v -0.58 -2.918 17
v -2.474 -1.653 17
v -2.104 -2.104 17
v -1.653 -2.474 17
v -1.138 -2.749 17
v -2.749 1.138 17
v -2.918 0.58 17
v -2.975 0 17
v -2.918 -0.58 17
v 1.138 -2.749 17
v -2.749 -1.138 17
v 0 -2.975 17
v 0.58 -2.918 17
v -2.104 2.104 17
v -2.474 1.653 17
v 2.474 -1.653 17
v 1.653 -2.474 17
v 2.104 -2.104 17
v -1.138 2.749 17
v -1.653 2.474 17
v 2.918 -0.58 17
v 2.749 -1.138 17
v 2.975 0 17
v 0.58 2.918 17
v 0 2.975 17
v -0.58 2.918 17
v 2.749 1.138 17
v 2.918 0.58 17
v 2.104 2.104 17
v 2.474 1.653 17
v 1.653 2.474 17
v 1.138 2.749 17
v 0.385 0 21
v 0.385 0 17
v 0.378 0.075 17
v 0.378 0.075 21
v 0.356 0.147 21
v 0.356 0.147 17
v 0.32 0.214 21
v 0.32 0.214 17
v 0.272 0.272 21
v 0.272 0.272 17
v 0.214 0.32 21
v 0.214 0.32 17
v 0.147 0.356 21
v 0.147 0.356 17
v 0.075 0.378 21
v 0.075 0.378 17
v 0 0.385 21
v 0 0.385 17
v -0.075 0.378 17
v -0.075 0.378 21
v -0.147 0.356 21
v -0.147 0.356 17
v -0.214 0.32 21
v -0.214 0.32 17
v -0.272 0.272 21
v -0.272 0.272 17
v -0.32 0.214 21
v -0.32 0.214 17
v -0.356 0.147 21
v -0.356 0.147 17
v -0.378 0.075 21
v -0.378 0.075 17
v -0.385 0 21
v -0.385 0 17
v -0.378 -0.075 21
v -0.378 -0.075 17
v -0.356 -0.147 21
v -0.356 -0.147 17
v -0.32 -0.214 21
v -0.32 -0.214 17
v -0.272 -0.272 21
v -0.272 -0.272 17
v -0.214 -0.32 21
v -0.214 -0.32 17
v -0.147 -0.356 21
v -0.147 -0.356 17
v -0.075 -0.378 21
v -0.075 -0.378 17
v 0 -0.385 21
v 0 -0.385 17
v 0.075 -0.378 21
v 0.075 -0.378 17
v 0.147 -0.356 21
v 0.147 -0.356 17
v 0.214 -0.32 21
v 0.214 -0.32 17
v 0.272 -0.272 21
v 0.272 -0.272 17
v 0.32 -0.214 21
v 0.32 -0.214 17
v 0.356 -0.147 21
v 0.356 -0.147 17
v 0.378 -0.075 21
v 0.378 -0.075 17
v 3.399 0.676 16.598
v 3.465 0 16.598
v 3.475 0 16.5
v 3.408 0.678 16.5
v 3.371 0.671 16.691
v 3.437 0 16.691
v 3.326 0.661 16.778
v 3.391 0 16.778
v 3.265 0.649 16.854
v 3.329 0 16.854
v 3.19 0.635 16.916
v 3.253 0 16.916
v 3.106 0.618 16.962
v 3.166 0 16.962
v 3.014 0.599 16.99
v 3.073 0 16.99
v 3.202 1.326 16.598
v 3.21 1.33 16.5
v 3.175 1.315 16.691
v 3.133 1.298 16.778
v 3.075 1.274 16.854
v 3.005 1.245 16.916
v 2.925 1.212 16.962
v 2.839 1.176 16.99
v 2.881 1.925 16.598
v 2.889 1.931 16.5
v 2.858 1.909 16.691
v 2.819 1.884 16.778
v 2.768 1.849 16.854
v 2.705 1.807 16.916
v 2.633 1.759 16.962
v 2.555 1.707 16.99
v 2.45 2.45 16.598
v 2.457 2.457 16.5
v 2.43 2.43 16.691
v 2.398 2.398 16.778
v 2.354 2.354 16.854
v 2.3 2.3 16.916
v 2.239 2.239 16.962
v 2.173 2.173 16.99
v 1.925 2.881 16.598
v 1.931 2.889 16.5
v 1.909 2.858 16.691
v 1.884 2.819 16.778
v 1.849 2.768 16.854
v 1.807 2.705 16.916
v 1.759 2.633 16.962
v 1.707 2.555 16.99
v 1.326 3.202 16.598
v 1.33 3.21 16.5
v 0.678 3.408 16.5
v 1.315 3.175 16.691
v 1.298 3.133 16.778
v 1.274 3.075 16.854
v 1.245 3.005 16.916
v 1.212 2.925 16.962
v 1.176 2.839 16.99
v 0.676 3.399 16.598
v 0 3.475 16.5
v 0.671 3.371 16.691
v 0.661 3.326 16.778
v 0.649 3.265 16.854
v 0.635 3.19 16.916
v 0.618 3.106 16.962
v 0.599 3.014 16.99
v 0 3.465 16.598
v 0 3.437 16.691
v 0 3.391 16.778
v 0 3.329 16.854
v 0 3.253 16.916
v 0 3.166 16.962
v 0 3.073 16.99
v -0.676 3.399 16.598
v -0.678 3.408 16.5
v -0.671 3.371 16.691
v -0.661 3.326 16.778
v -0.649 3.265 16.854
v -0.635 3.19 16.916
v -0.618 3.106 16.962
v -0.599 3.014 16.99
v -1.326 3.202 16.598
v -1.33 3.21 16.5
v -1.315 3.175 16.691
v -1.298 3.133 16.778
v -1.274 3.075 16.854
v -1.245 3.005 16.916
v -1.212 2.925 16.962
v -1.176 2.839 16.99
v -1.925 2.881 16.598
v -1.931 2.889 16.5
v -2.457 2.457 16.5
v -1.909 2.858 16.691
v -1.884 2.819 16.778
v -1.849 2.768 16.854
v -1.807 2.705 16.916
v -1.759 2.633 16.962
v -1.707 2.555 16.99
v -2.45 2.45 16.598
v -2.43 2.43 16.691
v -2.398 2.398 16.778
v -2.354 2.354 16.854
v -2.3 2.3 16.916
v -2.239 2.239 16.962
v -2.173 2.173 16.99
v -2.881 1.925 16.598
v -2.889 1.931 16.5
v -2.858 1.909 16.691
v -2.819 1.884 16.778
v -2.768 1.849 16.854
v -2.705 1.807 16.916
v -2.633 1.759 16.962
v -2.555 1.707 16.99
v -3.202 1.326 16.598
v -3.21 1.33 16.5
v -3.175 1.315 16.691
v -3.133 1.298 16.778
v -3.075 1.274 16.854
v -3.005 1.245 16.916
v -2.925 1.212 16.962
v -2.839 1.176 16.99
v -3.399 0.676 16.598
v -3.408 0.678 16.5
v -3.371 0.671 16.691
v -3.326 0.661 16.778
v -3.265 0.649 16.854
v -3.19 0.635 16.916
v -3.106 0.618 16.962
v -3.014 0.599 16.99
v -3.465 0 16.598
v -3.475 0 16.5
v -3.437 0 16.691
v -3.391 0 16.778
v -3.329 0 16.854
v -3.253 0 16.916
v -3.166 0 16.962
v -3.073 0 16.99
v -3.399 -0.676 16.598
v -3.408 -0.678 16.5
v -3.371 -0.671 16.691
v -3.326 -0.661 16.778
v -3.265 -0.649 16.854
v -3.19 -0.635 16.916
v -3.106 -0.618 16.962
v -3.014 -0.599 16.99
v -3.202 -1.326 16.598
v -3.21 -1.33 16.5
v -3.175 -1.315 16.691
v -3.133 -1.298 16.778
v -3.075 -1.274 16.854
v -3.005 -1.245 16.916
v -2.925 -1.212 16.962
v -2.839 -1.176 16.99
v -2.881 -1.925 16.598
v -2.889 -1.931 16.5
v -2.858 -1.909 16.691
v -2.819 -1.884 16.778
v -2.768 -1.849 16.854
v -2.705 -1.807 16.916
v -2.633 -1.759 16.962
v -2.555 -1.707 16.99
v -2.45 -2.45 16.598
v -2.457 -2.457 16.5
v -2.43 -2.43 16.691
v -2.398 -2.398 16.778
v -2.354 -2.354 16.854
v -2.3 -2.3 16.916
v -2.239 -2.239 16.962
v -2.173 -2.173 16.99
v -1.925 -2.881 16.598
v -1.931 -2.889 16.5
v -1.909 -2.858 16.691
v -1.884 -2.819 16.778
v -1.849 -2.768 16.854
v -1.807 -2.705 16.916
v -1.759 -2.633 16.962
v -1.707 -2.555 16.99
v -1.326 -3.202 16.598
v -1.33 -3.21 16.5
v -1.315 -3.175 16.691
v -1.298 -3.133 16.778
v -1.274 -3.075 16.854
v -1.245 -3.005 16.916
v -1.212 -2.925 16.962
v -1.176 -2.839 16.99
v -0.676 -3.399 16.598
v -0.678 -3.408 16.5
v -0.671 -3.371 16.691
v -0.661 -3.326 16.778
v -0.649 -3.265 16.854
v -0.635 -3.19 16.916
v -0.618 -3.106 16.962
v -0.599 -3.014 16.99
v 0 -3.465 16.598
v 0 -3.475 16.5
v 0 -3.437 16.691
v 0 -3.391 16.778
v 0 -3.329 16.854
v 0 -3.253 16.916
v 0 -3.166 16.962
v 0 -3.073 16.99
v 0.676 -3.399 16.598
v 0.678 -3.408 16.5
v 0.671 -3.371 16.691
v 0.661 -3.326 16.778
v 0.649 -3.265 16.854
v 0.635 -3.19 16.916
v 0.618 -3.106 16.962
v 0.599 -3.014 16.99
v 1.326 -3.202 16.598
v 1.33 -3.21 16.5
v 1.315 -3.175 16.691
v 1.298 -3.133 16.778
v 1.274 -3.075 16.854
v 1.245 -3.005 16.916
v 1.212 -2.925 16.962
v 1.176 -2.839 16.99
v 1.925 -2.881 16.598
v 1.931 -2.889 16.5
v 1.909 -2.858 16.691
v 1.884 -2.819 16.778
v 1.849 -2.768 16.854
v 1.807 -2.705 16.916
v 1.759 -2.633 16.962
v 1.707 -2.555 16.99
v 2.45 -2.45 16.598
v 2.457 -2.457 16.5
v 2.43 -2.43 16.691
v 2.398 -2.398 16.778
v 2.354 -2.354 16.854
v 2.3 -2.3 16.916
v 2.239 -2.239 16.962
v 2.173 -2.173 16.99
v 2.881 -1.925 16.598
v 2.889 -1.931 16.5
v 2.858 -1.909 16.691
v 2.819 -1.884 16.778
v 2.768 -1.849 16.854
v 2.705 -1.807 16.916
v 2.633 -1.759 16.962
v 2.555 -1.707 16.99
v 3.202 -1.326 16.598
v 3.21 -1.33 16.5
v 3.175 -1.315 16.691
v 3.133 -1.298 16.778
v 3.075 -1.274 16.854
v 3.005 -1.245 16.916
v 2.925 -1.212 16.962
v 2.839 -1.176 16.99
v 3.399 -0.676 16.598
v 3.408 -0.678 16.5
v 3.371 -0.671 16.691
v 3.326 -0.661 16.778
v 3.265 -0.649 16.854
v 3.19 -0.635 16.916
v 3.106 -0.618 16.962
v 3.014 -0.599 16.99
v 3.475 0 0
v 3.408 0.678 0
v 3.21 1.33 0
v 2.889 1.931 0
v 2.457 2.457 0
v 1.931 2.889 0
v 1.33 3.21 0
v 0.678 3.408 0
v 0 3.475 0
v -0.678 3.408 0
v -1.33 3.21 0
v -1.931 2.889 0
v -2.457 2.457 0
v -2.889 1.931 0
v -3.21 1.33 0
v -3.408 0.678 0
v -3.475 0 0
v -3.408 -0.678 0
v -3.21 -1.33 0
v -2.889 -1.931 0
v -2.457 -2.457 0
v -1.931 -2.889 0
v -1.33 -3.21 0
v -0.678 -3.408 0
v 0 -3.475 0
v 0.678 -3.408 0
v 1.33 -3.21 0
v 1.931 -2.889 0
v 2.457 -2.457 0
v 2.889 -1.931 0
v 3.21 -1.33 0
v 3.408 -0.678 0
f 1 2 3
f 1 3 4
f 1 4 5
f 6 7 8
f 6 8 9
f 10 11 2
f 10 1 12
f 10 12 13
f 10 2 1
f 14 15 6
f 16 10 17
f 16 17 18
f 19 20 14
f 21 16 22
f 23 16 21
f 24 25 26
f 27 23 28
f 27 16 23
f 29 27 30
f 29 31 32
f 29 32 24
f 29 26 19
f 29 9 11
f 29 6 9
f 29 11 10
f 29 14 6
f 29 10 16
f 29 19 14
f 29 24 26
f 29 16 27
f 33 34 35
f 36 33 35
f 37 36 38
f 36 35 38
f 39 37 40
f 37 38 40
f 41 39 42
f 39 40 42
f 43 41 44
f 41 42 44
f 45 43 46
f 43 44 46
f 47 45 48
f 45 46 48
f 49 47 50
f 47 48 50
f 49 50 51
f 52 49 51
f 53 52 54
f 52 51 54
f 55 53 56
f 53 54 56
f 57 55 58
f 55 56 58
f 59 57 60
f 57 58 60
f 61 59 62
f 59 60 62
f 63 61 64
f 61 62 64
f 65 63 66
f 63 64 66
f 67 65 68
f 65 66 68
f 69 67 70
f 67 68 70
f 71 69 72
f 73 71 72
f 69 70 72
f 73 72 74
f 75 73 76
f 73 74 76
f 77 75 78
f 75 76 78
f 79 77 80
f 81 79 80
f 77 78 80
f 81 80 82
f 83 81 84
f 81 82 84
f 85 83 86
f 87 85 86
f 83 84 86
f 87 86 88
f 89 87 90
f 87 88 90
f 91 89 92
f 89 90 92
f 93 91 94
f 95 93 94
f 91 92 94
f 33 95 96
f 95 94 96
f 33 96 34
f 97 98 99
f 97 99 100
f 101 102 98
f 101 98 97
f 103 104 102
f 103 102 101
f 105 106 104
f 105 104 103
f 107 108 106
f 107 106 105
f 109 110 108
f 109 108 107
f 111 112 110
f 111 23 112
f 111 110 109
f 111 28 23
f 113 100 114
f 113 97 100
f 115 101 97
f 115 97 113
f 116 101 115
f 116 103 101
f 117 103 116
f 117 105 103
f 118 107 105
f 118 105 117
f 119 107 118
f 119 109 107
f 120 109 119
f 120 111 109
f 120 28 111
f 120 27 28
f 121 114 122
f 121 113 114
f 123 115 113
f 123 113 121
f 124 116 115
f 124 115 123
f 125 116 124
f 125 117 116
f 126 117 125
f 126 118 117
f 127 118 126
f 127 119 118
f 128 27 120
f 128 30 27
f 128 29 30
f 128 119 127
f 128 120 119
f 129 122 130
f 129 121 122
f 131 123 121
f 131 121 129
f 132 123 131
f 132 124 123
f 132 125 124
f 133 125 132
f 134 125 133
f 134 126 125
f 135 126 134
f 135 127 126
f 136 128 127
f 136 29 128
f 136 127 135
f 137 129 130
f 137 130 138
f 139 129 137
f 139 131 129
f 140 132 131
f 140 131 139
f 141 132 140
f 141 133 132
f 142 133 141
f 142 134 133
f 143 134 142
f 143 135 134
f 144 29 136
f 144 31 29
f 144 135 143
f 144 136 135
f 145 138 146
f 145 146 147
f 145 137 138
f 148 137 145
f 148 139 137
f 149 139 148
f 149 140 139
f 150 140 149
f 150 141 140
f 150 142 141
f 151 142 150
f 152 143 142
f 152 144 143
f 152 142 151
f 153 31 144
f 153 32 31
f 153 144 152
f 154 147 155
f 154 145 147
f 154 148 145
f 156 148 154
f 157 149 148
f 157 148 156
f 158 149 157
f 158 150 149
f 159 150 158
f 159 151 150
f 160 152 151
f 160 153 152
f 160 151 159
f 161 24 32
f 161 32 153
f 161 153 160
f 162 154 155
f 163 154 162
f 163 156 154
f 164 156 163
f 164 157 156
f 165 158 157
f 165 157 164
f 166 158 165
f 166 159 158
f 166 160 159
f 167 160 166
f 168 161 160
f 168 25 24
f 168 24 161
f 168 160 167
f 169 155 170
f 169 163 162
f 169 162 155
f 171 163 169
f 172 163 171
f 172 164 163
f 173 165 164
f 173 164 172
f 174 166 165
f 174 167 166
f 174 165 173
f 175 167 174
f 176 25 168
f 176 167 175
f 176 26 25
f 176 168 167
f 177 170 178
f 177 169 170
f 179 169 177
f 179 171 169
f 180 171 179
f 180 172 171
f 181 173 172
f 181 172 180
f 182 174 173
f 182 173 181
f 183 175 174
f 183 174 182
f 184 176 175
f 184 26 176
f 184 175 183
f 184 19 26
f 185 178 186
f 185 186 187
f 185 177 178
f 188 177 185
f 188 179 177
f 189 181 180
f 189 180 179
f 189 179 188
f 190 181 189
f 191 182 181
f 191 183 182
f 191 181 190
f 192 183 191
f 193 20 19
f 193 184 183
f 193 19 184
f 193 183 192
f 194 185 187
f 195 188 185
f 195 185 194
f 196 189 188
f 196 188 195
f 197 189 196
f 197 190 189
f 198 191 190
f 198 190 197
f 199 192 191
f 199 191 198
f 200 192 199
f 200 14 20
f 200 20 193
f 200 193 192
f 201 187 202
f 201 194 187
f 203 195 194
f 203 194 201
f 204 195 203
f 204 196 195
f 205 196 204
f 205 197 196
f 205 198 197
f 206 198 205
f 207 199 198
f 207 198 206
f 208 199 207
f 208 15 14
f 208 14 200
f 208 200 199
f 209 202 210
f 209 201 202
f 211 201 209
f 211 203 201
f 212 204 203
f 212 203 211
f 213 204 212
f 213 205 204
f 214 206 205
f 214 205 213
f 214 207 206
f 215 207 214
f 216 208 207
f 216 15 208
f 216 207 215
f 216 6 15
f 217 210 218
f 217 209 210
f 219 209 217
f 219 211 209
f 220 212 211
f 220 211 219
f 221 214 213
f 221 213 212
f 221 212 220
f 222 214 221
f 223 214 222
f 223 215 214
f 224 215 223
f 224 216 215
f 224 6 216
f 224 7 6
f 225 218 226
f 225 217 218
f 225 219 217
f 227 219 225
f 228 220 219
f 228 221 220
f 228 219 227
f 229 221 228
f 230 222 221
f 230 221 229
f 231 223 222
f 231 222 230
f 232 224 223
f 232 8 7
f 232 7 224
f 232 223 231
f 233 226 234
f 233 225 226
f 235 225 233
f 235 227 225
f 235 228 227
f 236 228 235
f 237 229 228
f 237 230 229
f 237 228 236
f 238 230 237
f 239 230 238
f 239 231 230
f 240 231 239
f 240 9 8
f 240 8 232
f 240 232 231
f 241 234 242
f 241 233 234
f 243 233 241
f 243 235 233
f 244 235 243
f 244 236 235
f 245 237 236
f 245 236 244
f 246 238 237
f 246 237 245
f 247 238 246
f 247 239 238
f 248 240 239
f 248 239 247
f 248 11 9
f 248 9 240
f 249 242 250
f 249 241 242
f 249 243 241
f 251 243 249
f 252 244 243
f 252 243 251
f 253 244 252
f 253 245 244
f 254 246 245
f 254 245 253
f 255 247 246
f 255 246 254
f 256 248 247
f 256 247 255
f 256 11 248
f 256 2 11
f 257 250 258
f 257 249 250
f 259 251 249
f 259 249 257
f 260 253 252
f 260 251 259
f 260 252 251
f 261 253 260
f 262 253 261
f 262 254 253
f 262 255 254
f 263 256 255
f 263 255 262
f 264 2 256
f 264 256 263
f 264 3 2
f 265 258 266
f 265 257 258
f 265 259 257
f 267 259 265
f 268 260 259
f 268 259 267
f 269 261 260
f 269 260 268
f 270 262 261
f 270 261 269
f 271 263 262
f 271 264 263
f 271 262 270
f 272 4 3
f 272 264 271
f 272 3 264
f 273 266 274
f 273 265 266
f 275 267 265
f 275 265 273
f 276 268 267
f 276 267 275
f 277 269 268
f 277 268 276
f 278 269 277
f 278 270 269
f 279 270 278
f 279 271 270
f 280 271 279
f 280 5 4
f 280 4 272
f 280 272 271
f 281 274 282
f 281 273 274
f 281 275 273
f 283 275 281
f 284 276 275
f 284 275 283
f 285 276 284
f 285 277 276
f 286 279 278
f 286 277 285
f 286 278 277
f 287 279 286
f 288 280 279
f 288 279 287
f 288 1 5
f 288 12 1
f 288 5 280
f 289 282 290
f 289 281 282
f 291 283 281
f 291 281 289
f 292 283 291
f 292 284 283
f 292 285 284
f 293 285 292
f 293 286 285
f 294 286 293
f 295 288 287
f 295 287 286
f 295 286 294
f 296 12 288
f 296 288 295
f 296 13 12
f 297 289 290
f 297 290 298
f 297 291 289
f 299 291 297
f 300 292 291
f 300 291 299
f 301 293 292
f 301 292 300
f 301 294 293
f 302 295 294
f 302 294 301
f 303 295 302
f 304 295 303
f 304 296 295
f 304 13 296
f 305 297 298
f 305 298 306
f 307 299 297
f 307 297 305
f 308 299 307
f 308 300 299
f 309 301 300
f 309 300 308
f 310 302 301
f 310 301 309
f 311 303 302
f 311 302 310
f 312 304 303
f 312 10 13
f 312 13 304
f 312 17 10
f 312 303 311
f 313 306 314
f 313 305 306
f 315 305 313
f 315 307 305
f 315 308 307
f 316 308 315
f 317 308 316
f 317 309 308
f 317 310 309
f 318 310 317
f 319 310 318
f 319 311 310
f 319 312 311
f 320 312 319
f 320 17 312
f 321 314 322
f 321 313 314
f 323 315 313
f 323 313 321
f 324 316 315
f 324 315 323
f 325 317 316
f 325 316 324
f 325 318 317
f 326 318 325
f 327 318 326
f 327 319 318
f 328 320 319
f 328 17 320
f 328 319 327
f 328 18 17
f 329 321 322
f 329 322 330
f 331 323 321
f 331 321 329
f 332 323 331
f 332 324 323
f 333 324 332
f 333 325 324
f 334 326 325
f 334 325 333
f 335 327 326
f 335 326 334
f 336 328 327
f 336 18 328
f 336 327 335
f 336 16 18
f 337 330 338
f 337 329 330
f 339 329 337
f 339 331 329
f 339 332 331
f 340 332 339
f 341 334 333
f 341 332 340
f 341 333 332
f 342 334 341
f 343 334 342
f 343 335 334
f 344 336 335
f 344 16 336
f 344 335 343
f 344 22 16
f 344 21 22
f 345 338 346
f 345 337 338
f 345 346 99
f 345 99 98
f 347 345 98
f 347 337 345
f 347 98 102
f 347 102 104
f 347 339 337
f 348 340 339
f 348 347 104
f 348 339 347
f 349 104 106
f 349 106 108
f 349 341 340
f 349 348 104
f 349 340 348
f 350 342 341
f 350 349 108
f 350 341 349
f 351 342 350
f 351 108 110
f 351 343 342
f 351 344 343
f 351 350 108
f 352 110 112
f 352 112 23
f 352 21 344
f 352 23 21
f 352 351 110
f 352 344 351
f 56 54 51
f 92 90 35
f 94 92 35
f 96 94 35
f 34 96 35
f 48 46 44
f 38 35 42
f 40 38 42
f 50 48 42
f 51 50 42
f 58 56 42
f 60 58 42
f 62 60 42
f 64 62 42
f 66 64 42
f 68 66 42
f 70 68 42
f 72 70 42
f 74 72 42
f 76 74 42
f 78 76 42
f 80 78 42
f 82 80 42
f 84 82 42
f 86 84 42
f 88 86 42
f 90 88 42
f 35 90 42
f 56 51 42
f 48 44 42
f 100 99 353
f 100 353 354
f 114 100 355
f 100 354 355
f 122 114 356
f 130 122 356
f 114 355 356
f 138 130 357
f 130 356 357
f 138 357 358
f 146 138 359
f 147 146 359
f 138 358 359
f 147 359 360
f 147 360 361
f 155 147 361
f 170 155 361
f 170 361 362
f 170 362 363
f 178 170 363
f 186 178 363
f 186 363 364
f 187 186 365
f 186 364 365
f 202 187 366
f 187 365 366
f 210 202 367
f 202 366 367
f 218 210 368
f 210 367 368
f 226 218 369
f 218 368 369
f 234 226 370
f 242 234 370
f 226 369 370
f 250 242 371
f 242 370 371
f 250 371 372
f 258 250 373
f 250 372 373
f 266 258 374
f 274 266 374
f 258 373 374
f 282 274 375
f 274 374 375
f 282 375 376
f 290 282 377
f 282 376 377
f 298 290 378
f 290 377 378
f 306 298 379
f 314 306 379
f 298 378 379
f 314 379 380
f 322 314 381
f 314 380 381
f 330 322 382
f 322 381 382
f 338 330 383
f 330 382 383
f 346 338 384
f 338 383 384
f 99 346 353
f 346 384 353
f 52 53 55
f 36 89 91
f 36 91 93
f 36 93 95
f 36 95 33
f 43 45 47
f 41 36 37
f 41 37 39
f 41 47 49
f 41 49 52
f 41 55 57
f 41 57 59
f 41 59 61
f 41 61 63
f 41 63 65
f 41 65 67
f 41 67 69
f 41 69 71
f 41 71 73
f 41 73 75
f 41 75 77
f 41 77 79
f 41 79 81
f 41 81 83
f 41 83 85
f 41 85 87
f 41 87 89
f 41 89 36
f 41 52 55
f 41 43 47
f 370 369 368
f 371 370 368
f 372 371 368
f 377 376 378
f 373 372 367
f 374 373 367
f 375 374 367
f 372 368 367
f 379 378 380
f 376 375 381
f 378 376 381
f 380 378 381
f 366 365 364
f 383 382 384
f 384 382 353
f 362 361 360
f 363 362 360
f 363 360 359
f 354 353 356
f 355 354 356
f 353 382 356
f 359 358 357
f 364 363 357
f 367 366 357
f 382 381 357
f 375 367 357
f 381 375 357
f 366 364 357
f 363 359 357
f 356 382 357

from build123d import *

# Parameters (mm, degrees)
F0_R     = 3.475
F1_DEPTH = 17
F2_R     = 0.385
F3_DEPTH = 4
F4_R     = 0.5


with BuildPart() as f1:
    # F0 (on Top) → F1 (new body)
    with BuildSketch(Plane.XY):
        Circle(F0_R)
    extrude(amount=F1_DEPTH)

    # F4
    f4_edges = [f1.edges().sort_by_distance(p)[0] for p in [
        (-3.475, 0, 17),
    ]]
    fillet(f4_edges, radius=F4_R)


with BuildPart() as f3:
    # F2 (on face) → F3 (new body)
    with BuildSketch(Plane.XY.offset(17)):
        Circle(F2_R)
    extrude(amount=F3_DEPTH)


solid = Compound([f1.part, f3.part])
